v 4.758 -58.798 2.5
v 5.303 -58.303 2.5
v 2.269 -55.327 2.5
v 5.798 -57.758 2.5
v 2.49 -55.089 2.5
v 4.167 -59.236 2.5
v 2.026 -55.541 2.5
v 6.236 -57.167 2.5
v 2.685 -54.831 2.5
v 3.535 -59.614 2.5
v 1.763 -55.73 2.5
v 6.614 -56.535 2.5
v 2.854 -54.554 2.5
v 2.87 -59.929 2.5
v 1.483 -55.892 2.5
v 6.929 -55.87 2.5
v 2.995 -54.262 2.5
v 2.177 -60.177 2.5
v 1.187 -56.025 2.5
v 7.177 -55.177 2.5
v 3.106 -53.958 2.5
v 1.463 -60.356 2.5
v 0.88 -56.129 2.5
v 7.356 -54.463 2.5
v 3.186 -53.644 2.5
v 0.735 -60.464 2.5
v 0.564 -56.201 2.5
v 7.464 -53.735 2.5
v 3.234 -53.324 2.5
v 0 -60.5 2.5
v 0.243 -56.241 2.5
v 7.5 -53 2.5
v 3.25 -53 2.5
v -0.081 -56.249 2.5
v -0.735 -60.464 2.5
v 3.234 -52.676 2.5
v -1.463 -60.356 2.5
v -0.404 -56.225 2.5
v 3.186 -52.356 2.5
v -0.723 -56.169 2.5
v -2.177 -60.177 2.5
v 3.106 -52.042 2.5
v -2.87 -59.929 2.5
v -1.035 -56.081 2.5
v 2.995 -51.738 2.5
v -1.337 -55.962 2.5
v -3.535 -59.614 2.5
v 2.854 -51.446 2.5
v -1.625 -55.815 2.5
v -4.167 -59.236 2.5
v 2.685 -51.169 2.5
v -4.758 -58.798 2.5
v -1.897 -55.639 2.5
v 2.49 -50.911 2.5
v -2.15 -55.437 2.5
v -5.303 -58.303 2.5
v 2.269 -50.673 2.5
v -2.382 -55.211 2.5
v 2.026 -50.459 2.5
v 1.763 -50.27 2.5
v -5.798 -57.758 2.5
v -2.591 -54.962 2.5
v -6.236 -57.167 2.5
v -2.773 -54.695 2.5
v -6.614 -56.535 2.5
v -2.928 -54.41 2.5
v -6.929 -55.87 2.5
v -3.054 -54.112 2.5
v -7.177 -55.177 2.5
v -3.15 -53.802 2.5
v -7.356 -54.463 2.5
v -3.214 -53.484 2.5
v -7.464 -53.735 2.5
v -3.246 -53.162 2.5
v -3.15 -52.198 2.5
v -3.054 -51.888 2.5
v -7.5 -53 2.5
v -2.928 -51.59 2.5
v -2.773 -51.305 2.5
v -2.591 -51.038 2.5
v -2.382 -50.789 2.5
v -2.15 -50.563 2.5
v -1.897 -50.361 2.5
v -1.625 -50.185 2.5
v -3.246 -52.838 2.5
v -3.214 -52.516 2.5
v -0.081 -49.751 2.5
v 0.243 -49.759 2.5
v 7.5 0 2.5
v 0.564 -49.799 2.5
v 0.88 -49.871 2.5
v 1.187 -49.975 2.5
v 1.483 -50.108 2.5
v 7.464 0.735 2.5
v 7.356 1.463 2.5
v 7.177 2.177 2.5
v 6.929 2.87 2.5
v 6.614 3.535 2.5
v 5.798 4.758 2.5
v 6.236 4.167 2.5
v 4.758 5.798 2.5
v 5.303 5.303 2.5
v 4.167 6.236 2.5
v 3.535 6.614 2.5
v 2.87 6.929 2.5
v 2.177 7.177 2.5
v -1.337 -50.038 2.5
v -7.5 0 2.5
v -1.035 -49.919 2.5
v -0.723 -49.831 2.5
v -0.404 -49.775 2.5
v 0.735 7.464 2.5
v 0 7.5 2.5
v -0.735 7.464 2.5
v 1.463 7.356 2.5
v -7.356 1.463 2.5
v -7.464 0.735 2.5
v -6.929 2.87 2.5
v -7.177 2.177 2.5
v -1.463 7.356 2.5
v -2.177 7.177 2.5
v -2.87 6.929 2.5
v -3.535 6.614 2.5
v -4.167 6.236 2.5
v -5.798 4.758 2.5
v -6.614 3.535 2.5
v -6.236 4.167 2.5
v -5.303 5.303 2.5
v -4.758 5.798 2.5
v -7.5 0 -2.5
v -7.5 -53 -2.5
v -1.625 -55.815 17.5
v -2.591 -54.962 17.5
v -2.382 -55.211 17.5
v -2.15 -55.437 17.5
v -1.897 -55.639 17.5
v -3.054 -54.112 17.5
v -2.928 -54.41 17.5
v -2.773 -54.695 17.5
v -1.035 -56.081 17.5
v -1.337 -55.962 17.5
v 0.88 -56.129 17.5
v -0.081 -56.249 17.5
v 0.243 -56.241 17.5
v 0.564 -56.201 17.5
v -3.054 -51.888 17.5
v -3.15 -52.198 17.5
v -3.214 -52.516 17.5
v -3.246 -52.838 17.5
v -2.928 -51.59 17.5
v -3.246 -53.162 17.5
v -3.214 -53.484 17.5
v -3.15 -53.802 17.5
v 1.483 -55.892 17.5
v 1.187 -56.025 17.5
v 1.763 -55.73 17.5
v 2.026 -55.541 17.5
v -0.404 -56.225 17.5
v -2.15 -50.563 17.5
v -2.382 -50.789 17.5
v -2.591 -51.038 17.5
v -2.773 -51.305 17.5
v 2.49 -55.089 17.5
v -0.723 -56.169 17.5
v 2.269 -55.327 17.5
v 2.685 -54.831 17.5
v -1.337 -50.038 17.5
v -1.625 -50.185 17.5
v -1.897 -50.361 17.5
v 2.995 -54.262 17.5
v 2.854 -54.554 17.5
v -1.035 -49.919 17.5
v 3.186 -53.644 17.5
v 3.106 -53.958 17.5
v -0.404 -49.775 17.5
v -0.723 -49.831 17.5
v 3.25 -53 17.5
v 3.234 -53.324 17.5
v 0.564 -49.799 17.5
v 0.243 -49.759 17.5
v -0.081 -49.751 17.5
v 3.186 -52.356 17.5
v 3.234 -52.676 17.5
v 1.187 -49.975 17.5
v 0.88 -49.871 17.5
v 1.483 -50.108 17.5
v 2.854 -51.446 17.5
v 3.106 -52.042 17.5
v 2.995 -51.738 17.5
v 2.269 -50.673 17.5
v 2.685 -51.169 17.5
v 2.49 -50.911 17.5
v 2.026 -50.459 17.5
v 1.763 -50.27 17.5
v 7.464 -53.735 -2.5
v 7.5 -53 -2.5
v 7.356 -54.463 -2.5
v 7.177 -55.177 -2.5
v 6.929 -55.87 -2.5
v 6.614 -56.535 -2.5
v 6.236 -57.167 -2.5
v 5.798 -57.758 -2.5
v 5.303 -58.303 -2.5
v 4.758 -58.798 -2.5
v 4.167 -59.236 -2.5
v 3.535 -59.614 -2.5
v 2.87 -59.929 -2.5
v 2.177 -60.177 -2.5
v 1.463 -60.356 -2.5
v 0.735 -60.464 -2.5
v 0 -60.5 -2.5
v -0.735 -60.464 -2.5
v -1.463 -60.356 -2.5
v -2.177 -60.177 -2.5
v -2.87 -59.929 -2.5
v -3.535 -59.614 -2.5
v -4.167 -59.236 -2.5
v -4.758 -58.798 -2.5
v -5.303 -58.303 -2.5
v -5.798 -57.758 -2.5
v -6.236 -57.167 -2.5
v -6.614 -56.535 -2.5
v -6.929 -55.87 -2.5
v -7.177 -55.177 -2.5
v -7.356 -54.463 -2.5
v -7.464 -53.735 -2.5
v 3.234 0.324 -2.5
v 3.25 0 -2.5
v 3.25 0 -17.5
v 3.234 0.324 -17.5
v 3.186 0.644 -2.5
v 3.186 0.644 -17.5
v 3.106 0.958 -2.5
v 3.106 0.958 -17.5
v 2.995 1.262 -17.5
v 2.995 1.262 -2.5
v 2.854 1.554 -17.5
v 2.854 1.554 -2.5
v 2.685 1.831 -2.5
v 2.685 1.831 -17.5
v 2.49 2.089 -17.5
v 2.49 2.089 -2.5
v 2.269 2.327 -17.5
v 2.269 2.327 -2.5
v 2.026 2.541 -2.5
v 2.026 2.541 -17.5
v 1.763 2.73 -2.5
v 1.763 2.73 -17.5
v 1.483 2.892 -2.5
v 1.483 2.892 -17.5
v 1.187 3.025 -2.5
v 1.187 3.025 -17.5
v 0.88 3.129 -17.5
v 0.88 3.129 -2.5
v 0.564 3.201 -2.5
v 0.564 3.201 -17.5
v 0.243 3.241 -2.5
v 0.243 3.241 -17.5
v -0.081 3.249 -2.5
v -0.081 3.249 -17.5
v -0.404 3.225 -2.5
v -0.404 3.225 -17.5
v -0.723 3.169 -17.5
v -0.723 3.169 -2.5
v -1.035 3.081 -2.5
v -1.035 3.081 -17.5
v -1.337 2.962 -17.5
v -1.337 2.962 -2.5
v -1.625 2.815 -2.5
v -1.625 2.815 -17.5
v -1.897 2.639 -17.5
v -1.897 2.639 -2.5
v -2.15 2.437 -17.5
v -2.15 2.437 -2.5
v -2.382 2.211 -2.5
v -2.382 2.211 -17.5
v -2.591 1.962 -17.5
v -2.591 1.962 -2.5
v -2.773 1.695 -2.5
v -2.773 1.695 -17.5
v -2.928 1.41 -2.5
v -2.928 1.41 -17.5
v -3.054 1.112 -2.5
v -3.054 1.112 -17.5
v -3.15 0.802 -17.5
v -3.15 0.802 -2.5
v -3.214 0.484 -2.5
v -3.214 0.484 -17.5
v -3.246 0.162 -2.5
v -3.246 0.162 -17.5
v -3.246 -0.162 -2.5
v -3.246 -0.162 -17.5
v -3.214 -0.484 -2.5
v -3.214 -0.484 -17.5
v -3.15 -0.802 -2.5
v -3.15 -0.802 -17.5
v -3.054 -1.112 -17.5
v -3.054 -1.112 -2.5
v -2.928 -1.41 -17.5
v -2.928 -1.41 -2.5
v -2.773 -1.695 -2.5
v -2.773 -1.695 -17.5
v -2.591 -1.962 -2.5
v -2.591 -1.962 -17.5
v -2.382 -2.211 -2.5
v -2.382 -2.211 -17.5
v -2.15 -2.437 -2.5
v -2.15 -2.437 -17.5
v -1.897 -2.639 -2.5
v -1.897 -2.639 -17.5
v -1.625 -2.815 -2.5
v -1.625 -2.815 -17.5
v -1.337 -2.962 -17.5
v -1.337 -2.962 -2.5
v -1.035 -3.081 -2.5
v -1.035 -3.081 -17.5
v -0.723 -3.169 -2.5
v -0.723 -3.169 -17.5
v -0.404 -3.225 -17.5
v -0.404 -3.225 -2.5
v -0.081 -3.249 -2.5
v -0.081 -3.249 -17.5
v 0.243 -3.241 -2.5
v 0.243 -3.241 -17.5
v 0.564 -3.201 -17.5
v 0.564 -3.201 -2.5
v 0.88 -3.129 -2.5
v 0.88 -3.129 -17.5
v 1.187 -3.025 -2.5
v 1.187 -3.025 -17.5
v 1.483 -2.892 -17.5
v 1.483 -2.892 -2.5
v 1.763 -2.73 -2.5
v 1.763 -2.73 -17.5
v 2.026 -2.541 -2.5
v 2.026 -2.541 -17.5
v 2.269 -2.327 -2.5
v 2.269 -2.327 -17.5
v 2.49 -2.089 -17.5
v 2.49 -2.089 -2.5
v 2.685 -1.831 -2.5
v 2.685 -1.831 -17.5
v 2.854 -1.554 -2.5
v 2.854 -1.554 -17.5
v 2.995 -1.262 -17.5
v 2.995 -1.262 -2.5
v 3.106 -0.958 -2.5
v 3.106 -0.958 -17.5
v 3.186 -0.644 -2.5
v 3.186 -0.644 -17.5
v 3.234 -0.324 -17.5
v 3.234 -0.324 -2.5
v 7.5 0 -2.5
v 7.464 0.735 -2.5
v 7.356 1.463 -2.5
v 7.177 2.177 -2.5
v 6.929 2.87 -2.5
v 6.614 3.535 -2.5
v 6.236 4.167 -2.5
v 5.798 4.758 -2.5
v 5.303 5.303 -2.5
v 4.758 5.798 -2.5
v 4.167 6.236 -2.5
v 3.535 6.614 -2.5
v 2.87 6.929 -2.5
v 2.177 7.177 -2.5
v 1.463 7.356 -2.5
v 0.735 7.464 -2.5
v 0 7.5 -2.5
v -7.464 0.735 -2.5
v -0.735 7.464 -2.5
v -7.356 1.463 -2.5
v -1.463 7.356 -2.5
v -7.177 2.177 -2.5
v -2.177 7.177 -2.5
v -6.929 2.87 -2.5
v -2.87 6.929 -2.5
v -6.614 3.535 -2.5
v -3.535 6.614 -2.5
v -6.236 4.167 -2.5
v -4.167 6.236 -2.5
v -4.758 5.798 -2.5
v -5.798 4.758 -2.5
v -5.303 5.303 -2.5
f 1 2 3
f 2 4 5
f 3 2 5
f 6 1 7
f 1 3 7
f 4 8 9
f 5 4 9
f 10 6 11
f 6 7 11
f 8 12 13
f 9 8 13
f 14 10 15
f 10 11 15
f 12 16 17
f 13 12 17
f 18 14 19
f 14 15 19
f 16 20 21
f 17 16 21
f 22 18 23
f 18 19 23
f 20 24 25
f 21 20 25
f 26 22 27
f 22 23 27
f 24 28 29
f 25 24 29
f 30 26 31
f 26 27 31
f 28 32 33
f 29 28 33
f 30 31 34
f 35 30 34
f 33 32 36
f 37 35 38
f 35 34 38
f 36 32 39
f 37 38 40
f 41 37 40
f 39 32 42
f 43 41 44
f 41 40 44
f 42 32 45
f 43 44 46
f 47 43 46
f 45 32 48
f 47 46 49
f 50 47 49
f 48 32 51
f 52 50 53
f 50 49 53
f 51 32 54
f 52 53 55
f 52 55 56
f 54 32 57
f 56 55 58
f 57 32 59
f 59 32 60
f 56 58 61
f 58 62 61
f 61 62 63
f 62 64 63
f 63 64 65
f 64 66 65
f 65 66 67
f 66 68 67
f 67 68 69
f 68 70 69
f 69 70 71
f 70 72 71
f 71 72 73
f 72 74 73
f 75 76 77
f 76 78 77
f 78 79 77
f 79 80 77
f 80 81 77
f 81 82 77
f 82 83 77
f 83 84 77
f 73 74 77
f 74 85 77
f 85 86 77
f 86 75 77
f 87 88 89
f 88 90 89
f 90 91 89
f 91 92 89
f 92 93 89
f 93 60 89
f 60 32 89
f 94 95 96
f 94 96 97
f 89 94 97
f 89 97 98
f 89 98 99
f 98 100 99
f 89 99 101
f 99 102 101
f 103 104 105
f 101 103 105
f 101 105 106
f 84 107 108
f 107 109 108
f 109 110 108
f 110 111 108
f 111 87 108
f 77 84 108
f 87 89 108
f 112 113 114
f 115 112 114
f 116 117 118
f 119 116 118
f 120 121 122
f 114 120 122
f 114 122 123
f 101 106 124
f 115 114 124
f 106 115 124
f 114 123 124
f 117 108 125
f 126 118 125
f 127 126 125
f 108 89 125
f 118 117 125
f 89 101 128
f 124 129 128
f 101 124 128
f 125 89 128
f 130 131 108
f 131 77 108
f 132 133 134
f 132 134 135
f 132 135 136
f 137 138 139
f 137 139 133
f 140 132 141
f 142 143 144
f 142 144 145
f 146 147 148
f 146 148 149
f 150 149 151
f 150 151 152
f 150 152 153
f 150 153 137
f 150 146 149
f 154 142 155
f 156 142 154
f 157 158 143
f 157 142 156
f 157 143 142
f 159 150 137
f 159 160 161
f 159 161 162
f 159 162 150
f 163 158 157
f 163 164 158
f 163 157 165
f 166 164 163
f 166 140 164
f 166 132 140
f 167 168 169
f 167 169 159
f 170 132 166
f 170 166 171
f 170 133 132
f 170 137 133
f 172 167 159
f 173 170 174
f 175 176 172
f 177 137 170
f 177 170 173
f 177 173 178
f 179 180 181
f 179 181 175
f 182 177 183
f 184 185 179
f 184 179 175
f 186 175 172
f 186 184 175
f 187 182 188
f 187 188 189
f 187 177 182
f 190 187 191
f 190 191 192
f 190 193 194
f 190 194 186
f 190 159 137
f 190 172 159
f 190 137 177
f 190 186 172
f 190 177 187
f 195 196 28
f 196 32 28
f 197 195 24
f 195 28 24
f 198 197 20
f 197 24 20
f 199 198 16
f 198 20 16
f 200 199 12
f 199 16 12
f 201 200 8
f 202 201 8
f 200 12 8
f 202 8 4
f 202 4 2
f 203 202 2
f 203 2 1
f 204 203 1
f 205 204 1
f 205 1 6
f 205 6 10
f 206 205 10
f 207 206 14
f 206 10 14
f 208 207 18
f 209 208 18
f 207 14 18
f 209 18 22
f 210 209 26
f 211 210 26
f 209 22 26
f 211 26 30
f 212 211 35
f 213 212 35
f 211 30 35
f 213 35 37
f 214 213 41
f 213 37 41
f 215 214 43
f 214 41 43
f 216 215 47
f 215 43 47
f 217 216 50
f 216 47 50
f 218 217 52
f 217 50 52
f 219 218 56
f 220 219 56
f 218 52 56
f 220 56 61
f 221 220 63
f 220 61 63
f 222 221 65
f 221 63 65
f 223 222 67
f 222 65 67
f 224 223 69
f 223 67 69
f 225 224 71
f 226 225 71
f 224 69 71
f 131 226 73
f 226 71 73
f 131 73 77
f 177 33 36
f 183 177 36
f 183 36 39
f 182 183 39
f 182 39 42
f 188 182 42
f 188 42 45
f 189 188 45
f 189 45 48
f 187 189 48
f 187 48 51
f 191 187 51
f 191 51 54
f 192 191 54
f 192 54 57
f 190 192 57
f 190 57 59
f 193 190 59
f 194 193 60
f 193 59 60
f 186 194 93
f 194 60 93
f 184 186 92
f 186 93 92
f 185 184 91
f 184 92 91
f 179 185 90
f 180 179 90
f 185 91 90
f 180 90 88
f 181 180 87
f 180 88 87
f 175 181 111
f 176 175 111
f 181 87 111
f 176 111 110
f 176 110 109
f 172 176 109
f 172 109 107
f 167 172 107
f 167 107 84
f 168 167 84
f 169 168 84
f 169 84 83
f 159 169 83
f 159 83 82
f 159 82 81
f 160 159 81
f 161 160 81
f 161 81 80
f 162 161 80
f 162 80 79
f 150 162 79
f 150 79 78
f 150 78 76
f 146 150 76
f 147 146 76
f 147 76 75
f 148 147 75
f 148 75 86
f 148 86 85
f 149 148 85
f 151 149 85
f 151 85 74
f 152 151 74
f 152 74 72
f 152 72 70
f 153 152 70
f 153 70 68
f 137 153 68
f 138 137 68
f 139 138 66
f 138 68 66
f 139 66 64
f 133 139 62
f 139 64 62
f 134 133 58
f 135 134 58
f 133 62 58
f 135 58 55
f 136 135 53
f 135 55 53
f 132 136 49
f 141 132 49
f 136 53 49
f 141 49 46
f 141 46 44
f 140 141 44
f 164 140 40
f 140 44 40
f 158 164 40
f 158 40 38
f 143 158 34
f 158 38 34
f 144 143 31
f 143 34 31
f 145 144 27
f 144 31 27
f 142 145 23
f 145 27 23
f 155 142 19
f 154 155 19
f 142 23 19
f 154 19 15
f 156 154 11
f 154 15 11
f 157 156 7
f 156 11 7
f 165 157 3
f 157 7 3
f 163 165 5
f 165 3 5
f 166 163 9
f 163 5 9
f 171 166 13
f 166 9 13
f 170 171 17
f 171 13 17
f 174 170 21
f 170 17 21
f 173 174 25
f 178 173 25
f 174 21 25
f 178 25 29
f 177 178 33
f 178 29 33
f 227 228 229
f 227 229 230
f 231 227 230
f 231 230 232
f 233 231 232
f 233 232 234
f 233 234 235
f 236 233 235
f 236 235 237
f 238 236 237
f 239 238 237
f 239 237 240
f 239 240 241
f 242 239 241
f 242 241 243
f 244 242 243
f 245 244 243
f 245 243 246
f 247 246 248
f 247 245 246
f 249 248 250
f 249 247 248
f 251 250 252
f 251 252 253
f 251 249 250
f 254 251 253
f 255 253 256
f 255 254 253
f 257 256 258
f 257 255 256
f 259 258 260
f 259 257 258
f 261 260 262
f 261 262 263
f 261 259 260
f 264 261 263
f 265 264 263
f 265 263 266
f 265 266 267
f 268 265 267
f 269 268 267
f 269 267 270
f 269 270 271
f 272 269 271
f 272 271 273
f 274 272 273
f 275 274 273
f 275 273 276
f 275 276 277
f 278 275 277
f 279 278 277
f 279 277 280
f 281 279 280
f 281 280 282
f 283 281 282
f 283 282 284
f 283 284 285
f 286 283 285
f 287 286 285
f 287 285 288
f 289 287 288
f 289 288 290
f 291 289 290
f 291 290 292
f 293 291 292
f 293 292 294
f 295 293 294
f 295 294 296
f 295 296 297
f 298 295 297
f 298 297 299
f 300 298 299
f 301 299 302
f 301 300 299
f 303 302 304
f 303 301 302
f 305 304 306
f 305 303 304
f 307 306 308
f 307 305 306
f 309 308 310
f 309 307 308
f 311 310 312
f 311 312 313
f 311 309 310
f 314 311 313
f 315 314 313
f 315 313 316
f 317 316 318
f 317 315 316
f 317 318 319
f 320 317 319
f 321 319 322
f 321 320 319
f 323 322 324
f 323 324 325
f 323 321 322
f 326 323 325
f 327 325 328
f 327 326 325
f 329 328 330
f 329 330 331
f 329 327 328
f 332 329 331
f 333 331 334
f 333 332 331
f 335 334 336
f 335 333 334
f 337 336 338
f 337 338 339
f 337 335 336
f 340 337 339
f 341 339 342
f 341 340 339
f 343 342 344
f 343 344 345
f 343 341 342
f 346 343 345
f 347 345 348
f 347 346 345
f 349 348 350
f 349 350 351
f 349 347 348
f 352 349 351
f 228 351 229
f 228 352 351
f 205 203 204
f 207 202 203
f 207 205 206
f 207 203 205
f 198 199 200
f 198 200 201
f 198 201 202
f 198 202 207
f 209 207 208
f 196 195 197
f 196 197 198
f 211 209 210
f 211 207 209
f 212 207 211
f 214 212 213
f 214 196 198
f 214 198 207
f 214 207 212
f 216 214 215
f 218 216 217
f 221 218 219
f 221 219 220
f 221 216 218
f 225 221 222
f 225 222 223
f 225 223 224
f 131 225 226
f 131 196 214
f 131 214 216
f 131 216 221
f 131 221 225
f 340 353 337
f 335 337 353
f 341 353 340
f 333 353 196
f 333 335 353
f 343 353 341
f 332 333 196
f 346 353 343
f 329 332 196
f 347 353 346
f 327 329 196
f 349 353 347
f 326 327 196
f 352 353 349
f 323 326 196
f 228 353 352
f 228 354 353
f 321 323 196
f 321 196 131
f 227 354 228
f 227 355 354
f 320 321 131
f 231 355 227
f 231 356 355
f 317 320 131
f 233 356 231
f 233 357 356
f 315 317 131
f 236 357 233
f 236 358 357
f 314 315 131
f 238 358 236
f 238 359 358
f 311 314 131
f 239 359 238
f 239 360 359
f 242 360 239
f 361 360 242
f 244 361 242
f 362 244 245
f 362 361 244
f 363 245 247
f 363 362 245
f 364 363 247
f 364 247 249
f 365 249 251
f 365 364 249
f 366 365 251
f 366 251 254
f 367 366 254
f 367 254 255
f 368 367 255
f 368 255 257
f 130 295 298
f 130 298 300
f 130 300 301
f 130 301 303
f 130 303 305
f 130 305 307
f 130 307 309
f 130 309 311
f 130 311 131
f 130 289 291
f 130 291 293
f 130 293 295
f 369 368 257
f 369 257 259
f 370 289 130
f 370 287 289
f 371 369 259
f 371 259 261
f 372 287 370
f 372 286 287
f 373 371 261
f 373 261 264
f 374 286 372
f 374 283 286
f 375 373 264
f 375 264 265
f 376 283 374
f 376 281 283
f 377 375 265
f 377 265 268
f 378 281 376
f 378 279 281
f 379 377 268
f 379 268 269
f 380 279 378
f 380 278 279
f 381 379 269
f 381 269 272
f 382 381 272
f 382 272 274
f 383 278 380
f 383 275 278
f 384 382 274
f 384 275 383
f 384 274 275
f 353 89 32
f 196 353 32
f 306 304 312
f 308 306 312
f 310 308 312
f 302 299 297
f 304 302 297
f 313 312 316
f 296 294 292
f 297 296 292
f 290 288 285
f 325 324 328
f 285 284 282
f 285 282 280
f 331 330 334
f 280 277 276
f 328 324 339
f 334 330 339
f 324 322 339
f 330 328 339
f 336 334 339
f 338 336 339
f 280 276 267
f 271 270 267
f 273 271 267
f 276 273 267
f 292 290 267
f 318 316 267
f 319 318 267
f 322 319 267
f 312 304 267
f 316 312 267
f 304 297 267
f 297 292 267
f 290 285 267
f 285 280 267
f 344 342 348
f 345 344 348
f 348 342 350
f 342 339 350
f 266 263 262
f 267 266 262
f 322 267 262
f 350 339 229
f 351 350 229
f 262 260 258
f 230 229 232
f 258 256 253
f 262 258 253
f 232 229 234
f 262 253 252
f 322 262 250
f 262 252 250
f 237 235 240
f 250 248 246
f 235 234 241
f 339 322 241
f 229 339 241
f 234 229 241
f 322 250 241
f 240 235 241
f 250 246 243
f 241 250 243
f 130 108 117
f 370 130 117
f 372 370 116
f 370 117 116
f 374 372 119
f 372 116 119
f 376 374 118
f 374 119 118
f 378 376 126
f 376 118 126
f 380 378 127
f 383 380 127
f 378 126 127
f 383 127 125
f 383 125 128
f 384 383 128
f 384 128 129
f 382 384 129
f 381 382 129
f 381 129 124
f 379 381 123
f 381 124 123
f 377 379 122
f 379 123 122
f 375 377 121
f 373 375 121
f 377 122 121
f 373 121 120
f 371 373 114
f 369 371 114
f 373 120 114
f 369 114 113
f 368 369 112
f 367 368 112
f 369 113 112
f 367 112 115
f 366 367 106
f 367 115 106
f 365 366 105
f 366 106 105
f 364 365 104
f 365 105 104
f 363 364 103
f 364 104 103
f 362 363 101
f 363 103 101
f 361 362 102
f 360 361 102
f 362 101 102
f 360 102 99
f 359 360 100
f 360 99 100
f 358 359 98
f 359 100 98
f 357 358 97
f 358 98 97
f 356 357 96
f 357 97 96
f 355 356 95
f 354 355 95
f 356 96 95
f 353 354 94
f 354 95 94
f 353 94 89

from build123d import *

# Parameters (mm, degrees)
BOSS_EXTRUDE1_DEPTH = 2.5
SKETCH1_3_R         = 3.25
BOSS_EXTRUDE2_DEPTH = 17.5
SKETCH1_4_R         = 3.25
BOSS_EXTRUDE3_DEPTH = 17.5


with BuildPart() as part:
    # Sketch1 → Boss-Extrude1 (new, symmetric)
    with BuildSketch(Plane.XY):
        with BuildLine():
            Line((7.5, -53), (7.5, 0))
            ThreePointArc((7.5, 0), (0, 7.5), (-7.5, 0))
            Line((-7.5, 0), (-7.5, -53))
            ThreePointArc((-7.5, -53), (0, -60.5), (7.5, -53))
        make_face()
    extrude(amount=BOSS_EXTRUDE1_DEPTH, both=True)

    # Sketch1<3> → Boss-Extrude2 (add)
    with BuildSketch(Plane.XY):
        Circle(SKETCH1_3_R)
    extrude(amount=-BOSS_EXTRUDE2_DEPTH)

    # Sketch1<4> → Boss-Extrude3 (add)
    with BuildSketch(Plane.XY):
        with Locations((0, -53)):
            Circle(SKETCH1_4_R)
    extrude(amount=BOSS_EXTRUDE3_DEPTH)


solid = part.part
